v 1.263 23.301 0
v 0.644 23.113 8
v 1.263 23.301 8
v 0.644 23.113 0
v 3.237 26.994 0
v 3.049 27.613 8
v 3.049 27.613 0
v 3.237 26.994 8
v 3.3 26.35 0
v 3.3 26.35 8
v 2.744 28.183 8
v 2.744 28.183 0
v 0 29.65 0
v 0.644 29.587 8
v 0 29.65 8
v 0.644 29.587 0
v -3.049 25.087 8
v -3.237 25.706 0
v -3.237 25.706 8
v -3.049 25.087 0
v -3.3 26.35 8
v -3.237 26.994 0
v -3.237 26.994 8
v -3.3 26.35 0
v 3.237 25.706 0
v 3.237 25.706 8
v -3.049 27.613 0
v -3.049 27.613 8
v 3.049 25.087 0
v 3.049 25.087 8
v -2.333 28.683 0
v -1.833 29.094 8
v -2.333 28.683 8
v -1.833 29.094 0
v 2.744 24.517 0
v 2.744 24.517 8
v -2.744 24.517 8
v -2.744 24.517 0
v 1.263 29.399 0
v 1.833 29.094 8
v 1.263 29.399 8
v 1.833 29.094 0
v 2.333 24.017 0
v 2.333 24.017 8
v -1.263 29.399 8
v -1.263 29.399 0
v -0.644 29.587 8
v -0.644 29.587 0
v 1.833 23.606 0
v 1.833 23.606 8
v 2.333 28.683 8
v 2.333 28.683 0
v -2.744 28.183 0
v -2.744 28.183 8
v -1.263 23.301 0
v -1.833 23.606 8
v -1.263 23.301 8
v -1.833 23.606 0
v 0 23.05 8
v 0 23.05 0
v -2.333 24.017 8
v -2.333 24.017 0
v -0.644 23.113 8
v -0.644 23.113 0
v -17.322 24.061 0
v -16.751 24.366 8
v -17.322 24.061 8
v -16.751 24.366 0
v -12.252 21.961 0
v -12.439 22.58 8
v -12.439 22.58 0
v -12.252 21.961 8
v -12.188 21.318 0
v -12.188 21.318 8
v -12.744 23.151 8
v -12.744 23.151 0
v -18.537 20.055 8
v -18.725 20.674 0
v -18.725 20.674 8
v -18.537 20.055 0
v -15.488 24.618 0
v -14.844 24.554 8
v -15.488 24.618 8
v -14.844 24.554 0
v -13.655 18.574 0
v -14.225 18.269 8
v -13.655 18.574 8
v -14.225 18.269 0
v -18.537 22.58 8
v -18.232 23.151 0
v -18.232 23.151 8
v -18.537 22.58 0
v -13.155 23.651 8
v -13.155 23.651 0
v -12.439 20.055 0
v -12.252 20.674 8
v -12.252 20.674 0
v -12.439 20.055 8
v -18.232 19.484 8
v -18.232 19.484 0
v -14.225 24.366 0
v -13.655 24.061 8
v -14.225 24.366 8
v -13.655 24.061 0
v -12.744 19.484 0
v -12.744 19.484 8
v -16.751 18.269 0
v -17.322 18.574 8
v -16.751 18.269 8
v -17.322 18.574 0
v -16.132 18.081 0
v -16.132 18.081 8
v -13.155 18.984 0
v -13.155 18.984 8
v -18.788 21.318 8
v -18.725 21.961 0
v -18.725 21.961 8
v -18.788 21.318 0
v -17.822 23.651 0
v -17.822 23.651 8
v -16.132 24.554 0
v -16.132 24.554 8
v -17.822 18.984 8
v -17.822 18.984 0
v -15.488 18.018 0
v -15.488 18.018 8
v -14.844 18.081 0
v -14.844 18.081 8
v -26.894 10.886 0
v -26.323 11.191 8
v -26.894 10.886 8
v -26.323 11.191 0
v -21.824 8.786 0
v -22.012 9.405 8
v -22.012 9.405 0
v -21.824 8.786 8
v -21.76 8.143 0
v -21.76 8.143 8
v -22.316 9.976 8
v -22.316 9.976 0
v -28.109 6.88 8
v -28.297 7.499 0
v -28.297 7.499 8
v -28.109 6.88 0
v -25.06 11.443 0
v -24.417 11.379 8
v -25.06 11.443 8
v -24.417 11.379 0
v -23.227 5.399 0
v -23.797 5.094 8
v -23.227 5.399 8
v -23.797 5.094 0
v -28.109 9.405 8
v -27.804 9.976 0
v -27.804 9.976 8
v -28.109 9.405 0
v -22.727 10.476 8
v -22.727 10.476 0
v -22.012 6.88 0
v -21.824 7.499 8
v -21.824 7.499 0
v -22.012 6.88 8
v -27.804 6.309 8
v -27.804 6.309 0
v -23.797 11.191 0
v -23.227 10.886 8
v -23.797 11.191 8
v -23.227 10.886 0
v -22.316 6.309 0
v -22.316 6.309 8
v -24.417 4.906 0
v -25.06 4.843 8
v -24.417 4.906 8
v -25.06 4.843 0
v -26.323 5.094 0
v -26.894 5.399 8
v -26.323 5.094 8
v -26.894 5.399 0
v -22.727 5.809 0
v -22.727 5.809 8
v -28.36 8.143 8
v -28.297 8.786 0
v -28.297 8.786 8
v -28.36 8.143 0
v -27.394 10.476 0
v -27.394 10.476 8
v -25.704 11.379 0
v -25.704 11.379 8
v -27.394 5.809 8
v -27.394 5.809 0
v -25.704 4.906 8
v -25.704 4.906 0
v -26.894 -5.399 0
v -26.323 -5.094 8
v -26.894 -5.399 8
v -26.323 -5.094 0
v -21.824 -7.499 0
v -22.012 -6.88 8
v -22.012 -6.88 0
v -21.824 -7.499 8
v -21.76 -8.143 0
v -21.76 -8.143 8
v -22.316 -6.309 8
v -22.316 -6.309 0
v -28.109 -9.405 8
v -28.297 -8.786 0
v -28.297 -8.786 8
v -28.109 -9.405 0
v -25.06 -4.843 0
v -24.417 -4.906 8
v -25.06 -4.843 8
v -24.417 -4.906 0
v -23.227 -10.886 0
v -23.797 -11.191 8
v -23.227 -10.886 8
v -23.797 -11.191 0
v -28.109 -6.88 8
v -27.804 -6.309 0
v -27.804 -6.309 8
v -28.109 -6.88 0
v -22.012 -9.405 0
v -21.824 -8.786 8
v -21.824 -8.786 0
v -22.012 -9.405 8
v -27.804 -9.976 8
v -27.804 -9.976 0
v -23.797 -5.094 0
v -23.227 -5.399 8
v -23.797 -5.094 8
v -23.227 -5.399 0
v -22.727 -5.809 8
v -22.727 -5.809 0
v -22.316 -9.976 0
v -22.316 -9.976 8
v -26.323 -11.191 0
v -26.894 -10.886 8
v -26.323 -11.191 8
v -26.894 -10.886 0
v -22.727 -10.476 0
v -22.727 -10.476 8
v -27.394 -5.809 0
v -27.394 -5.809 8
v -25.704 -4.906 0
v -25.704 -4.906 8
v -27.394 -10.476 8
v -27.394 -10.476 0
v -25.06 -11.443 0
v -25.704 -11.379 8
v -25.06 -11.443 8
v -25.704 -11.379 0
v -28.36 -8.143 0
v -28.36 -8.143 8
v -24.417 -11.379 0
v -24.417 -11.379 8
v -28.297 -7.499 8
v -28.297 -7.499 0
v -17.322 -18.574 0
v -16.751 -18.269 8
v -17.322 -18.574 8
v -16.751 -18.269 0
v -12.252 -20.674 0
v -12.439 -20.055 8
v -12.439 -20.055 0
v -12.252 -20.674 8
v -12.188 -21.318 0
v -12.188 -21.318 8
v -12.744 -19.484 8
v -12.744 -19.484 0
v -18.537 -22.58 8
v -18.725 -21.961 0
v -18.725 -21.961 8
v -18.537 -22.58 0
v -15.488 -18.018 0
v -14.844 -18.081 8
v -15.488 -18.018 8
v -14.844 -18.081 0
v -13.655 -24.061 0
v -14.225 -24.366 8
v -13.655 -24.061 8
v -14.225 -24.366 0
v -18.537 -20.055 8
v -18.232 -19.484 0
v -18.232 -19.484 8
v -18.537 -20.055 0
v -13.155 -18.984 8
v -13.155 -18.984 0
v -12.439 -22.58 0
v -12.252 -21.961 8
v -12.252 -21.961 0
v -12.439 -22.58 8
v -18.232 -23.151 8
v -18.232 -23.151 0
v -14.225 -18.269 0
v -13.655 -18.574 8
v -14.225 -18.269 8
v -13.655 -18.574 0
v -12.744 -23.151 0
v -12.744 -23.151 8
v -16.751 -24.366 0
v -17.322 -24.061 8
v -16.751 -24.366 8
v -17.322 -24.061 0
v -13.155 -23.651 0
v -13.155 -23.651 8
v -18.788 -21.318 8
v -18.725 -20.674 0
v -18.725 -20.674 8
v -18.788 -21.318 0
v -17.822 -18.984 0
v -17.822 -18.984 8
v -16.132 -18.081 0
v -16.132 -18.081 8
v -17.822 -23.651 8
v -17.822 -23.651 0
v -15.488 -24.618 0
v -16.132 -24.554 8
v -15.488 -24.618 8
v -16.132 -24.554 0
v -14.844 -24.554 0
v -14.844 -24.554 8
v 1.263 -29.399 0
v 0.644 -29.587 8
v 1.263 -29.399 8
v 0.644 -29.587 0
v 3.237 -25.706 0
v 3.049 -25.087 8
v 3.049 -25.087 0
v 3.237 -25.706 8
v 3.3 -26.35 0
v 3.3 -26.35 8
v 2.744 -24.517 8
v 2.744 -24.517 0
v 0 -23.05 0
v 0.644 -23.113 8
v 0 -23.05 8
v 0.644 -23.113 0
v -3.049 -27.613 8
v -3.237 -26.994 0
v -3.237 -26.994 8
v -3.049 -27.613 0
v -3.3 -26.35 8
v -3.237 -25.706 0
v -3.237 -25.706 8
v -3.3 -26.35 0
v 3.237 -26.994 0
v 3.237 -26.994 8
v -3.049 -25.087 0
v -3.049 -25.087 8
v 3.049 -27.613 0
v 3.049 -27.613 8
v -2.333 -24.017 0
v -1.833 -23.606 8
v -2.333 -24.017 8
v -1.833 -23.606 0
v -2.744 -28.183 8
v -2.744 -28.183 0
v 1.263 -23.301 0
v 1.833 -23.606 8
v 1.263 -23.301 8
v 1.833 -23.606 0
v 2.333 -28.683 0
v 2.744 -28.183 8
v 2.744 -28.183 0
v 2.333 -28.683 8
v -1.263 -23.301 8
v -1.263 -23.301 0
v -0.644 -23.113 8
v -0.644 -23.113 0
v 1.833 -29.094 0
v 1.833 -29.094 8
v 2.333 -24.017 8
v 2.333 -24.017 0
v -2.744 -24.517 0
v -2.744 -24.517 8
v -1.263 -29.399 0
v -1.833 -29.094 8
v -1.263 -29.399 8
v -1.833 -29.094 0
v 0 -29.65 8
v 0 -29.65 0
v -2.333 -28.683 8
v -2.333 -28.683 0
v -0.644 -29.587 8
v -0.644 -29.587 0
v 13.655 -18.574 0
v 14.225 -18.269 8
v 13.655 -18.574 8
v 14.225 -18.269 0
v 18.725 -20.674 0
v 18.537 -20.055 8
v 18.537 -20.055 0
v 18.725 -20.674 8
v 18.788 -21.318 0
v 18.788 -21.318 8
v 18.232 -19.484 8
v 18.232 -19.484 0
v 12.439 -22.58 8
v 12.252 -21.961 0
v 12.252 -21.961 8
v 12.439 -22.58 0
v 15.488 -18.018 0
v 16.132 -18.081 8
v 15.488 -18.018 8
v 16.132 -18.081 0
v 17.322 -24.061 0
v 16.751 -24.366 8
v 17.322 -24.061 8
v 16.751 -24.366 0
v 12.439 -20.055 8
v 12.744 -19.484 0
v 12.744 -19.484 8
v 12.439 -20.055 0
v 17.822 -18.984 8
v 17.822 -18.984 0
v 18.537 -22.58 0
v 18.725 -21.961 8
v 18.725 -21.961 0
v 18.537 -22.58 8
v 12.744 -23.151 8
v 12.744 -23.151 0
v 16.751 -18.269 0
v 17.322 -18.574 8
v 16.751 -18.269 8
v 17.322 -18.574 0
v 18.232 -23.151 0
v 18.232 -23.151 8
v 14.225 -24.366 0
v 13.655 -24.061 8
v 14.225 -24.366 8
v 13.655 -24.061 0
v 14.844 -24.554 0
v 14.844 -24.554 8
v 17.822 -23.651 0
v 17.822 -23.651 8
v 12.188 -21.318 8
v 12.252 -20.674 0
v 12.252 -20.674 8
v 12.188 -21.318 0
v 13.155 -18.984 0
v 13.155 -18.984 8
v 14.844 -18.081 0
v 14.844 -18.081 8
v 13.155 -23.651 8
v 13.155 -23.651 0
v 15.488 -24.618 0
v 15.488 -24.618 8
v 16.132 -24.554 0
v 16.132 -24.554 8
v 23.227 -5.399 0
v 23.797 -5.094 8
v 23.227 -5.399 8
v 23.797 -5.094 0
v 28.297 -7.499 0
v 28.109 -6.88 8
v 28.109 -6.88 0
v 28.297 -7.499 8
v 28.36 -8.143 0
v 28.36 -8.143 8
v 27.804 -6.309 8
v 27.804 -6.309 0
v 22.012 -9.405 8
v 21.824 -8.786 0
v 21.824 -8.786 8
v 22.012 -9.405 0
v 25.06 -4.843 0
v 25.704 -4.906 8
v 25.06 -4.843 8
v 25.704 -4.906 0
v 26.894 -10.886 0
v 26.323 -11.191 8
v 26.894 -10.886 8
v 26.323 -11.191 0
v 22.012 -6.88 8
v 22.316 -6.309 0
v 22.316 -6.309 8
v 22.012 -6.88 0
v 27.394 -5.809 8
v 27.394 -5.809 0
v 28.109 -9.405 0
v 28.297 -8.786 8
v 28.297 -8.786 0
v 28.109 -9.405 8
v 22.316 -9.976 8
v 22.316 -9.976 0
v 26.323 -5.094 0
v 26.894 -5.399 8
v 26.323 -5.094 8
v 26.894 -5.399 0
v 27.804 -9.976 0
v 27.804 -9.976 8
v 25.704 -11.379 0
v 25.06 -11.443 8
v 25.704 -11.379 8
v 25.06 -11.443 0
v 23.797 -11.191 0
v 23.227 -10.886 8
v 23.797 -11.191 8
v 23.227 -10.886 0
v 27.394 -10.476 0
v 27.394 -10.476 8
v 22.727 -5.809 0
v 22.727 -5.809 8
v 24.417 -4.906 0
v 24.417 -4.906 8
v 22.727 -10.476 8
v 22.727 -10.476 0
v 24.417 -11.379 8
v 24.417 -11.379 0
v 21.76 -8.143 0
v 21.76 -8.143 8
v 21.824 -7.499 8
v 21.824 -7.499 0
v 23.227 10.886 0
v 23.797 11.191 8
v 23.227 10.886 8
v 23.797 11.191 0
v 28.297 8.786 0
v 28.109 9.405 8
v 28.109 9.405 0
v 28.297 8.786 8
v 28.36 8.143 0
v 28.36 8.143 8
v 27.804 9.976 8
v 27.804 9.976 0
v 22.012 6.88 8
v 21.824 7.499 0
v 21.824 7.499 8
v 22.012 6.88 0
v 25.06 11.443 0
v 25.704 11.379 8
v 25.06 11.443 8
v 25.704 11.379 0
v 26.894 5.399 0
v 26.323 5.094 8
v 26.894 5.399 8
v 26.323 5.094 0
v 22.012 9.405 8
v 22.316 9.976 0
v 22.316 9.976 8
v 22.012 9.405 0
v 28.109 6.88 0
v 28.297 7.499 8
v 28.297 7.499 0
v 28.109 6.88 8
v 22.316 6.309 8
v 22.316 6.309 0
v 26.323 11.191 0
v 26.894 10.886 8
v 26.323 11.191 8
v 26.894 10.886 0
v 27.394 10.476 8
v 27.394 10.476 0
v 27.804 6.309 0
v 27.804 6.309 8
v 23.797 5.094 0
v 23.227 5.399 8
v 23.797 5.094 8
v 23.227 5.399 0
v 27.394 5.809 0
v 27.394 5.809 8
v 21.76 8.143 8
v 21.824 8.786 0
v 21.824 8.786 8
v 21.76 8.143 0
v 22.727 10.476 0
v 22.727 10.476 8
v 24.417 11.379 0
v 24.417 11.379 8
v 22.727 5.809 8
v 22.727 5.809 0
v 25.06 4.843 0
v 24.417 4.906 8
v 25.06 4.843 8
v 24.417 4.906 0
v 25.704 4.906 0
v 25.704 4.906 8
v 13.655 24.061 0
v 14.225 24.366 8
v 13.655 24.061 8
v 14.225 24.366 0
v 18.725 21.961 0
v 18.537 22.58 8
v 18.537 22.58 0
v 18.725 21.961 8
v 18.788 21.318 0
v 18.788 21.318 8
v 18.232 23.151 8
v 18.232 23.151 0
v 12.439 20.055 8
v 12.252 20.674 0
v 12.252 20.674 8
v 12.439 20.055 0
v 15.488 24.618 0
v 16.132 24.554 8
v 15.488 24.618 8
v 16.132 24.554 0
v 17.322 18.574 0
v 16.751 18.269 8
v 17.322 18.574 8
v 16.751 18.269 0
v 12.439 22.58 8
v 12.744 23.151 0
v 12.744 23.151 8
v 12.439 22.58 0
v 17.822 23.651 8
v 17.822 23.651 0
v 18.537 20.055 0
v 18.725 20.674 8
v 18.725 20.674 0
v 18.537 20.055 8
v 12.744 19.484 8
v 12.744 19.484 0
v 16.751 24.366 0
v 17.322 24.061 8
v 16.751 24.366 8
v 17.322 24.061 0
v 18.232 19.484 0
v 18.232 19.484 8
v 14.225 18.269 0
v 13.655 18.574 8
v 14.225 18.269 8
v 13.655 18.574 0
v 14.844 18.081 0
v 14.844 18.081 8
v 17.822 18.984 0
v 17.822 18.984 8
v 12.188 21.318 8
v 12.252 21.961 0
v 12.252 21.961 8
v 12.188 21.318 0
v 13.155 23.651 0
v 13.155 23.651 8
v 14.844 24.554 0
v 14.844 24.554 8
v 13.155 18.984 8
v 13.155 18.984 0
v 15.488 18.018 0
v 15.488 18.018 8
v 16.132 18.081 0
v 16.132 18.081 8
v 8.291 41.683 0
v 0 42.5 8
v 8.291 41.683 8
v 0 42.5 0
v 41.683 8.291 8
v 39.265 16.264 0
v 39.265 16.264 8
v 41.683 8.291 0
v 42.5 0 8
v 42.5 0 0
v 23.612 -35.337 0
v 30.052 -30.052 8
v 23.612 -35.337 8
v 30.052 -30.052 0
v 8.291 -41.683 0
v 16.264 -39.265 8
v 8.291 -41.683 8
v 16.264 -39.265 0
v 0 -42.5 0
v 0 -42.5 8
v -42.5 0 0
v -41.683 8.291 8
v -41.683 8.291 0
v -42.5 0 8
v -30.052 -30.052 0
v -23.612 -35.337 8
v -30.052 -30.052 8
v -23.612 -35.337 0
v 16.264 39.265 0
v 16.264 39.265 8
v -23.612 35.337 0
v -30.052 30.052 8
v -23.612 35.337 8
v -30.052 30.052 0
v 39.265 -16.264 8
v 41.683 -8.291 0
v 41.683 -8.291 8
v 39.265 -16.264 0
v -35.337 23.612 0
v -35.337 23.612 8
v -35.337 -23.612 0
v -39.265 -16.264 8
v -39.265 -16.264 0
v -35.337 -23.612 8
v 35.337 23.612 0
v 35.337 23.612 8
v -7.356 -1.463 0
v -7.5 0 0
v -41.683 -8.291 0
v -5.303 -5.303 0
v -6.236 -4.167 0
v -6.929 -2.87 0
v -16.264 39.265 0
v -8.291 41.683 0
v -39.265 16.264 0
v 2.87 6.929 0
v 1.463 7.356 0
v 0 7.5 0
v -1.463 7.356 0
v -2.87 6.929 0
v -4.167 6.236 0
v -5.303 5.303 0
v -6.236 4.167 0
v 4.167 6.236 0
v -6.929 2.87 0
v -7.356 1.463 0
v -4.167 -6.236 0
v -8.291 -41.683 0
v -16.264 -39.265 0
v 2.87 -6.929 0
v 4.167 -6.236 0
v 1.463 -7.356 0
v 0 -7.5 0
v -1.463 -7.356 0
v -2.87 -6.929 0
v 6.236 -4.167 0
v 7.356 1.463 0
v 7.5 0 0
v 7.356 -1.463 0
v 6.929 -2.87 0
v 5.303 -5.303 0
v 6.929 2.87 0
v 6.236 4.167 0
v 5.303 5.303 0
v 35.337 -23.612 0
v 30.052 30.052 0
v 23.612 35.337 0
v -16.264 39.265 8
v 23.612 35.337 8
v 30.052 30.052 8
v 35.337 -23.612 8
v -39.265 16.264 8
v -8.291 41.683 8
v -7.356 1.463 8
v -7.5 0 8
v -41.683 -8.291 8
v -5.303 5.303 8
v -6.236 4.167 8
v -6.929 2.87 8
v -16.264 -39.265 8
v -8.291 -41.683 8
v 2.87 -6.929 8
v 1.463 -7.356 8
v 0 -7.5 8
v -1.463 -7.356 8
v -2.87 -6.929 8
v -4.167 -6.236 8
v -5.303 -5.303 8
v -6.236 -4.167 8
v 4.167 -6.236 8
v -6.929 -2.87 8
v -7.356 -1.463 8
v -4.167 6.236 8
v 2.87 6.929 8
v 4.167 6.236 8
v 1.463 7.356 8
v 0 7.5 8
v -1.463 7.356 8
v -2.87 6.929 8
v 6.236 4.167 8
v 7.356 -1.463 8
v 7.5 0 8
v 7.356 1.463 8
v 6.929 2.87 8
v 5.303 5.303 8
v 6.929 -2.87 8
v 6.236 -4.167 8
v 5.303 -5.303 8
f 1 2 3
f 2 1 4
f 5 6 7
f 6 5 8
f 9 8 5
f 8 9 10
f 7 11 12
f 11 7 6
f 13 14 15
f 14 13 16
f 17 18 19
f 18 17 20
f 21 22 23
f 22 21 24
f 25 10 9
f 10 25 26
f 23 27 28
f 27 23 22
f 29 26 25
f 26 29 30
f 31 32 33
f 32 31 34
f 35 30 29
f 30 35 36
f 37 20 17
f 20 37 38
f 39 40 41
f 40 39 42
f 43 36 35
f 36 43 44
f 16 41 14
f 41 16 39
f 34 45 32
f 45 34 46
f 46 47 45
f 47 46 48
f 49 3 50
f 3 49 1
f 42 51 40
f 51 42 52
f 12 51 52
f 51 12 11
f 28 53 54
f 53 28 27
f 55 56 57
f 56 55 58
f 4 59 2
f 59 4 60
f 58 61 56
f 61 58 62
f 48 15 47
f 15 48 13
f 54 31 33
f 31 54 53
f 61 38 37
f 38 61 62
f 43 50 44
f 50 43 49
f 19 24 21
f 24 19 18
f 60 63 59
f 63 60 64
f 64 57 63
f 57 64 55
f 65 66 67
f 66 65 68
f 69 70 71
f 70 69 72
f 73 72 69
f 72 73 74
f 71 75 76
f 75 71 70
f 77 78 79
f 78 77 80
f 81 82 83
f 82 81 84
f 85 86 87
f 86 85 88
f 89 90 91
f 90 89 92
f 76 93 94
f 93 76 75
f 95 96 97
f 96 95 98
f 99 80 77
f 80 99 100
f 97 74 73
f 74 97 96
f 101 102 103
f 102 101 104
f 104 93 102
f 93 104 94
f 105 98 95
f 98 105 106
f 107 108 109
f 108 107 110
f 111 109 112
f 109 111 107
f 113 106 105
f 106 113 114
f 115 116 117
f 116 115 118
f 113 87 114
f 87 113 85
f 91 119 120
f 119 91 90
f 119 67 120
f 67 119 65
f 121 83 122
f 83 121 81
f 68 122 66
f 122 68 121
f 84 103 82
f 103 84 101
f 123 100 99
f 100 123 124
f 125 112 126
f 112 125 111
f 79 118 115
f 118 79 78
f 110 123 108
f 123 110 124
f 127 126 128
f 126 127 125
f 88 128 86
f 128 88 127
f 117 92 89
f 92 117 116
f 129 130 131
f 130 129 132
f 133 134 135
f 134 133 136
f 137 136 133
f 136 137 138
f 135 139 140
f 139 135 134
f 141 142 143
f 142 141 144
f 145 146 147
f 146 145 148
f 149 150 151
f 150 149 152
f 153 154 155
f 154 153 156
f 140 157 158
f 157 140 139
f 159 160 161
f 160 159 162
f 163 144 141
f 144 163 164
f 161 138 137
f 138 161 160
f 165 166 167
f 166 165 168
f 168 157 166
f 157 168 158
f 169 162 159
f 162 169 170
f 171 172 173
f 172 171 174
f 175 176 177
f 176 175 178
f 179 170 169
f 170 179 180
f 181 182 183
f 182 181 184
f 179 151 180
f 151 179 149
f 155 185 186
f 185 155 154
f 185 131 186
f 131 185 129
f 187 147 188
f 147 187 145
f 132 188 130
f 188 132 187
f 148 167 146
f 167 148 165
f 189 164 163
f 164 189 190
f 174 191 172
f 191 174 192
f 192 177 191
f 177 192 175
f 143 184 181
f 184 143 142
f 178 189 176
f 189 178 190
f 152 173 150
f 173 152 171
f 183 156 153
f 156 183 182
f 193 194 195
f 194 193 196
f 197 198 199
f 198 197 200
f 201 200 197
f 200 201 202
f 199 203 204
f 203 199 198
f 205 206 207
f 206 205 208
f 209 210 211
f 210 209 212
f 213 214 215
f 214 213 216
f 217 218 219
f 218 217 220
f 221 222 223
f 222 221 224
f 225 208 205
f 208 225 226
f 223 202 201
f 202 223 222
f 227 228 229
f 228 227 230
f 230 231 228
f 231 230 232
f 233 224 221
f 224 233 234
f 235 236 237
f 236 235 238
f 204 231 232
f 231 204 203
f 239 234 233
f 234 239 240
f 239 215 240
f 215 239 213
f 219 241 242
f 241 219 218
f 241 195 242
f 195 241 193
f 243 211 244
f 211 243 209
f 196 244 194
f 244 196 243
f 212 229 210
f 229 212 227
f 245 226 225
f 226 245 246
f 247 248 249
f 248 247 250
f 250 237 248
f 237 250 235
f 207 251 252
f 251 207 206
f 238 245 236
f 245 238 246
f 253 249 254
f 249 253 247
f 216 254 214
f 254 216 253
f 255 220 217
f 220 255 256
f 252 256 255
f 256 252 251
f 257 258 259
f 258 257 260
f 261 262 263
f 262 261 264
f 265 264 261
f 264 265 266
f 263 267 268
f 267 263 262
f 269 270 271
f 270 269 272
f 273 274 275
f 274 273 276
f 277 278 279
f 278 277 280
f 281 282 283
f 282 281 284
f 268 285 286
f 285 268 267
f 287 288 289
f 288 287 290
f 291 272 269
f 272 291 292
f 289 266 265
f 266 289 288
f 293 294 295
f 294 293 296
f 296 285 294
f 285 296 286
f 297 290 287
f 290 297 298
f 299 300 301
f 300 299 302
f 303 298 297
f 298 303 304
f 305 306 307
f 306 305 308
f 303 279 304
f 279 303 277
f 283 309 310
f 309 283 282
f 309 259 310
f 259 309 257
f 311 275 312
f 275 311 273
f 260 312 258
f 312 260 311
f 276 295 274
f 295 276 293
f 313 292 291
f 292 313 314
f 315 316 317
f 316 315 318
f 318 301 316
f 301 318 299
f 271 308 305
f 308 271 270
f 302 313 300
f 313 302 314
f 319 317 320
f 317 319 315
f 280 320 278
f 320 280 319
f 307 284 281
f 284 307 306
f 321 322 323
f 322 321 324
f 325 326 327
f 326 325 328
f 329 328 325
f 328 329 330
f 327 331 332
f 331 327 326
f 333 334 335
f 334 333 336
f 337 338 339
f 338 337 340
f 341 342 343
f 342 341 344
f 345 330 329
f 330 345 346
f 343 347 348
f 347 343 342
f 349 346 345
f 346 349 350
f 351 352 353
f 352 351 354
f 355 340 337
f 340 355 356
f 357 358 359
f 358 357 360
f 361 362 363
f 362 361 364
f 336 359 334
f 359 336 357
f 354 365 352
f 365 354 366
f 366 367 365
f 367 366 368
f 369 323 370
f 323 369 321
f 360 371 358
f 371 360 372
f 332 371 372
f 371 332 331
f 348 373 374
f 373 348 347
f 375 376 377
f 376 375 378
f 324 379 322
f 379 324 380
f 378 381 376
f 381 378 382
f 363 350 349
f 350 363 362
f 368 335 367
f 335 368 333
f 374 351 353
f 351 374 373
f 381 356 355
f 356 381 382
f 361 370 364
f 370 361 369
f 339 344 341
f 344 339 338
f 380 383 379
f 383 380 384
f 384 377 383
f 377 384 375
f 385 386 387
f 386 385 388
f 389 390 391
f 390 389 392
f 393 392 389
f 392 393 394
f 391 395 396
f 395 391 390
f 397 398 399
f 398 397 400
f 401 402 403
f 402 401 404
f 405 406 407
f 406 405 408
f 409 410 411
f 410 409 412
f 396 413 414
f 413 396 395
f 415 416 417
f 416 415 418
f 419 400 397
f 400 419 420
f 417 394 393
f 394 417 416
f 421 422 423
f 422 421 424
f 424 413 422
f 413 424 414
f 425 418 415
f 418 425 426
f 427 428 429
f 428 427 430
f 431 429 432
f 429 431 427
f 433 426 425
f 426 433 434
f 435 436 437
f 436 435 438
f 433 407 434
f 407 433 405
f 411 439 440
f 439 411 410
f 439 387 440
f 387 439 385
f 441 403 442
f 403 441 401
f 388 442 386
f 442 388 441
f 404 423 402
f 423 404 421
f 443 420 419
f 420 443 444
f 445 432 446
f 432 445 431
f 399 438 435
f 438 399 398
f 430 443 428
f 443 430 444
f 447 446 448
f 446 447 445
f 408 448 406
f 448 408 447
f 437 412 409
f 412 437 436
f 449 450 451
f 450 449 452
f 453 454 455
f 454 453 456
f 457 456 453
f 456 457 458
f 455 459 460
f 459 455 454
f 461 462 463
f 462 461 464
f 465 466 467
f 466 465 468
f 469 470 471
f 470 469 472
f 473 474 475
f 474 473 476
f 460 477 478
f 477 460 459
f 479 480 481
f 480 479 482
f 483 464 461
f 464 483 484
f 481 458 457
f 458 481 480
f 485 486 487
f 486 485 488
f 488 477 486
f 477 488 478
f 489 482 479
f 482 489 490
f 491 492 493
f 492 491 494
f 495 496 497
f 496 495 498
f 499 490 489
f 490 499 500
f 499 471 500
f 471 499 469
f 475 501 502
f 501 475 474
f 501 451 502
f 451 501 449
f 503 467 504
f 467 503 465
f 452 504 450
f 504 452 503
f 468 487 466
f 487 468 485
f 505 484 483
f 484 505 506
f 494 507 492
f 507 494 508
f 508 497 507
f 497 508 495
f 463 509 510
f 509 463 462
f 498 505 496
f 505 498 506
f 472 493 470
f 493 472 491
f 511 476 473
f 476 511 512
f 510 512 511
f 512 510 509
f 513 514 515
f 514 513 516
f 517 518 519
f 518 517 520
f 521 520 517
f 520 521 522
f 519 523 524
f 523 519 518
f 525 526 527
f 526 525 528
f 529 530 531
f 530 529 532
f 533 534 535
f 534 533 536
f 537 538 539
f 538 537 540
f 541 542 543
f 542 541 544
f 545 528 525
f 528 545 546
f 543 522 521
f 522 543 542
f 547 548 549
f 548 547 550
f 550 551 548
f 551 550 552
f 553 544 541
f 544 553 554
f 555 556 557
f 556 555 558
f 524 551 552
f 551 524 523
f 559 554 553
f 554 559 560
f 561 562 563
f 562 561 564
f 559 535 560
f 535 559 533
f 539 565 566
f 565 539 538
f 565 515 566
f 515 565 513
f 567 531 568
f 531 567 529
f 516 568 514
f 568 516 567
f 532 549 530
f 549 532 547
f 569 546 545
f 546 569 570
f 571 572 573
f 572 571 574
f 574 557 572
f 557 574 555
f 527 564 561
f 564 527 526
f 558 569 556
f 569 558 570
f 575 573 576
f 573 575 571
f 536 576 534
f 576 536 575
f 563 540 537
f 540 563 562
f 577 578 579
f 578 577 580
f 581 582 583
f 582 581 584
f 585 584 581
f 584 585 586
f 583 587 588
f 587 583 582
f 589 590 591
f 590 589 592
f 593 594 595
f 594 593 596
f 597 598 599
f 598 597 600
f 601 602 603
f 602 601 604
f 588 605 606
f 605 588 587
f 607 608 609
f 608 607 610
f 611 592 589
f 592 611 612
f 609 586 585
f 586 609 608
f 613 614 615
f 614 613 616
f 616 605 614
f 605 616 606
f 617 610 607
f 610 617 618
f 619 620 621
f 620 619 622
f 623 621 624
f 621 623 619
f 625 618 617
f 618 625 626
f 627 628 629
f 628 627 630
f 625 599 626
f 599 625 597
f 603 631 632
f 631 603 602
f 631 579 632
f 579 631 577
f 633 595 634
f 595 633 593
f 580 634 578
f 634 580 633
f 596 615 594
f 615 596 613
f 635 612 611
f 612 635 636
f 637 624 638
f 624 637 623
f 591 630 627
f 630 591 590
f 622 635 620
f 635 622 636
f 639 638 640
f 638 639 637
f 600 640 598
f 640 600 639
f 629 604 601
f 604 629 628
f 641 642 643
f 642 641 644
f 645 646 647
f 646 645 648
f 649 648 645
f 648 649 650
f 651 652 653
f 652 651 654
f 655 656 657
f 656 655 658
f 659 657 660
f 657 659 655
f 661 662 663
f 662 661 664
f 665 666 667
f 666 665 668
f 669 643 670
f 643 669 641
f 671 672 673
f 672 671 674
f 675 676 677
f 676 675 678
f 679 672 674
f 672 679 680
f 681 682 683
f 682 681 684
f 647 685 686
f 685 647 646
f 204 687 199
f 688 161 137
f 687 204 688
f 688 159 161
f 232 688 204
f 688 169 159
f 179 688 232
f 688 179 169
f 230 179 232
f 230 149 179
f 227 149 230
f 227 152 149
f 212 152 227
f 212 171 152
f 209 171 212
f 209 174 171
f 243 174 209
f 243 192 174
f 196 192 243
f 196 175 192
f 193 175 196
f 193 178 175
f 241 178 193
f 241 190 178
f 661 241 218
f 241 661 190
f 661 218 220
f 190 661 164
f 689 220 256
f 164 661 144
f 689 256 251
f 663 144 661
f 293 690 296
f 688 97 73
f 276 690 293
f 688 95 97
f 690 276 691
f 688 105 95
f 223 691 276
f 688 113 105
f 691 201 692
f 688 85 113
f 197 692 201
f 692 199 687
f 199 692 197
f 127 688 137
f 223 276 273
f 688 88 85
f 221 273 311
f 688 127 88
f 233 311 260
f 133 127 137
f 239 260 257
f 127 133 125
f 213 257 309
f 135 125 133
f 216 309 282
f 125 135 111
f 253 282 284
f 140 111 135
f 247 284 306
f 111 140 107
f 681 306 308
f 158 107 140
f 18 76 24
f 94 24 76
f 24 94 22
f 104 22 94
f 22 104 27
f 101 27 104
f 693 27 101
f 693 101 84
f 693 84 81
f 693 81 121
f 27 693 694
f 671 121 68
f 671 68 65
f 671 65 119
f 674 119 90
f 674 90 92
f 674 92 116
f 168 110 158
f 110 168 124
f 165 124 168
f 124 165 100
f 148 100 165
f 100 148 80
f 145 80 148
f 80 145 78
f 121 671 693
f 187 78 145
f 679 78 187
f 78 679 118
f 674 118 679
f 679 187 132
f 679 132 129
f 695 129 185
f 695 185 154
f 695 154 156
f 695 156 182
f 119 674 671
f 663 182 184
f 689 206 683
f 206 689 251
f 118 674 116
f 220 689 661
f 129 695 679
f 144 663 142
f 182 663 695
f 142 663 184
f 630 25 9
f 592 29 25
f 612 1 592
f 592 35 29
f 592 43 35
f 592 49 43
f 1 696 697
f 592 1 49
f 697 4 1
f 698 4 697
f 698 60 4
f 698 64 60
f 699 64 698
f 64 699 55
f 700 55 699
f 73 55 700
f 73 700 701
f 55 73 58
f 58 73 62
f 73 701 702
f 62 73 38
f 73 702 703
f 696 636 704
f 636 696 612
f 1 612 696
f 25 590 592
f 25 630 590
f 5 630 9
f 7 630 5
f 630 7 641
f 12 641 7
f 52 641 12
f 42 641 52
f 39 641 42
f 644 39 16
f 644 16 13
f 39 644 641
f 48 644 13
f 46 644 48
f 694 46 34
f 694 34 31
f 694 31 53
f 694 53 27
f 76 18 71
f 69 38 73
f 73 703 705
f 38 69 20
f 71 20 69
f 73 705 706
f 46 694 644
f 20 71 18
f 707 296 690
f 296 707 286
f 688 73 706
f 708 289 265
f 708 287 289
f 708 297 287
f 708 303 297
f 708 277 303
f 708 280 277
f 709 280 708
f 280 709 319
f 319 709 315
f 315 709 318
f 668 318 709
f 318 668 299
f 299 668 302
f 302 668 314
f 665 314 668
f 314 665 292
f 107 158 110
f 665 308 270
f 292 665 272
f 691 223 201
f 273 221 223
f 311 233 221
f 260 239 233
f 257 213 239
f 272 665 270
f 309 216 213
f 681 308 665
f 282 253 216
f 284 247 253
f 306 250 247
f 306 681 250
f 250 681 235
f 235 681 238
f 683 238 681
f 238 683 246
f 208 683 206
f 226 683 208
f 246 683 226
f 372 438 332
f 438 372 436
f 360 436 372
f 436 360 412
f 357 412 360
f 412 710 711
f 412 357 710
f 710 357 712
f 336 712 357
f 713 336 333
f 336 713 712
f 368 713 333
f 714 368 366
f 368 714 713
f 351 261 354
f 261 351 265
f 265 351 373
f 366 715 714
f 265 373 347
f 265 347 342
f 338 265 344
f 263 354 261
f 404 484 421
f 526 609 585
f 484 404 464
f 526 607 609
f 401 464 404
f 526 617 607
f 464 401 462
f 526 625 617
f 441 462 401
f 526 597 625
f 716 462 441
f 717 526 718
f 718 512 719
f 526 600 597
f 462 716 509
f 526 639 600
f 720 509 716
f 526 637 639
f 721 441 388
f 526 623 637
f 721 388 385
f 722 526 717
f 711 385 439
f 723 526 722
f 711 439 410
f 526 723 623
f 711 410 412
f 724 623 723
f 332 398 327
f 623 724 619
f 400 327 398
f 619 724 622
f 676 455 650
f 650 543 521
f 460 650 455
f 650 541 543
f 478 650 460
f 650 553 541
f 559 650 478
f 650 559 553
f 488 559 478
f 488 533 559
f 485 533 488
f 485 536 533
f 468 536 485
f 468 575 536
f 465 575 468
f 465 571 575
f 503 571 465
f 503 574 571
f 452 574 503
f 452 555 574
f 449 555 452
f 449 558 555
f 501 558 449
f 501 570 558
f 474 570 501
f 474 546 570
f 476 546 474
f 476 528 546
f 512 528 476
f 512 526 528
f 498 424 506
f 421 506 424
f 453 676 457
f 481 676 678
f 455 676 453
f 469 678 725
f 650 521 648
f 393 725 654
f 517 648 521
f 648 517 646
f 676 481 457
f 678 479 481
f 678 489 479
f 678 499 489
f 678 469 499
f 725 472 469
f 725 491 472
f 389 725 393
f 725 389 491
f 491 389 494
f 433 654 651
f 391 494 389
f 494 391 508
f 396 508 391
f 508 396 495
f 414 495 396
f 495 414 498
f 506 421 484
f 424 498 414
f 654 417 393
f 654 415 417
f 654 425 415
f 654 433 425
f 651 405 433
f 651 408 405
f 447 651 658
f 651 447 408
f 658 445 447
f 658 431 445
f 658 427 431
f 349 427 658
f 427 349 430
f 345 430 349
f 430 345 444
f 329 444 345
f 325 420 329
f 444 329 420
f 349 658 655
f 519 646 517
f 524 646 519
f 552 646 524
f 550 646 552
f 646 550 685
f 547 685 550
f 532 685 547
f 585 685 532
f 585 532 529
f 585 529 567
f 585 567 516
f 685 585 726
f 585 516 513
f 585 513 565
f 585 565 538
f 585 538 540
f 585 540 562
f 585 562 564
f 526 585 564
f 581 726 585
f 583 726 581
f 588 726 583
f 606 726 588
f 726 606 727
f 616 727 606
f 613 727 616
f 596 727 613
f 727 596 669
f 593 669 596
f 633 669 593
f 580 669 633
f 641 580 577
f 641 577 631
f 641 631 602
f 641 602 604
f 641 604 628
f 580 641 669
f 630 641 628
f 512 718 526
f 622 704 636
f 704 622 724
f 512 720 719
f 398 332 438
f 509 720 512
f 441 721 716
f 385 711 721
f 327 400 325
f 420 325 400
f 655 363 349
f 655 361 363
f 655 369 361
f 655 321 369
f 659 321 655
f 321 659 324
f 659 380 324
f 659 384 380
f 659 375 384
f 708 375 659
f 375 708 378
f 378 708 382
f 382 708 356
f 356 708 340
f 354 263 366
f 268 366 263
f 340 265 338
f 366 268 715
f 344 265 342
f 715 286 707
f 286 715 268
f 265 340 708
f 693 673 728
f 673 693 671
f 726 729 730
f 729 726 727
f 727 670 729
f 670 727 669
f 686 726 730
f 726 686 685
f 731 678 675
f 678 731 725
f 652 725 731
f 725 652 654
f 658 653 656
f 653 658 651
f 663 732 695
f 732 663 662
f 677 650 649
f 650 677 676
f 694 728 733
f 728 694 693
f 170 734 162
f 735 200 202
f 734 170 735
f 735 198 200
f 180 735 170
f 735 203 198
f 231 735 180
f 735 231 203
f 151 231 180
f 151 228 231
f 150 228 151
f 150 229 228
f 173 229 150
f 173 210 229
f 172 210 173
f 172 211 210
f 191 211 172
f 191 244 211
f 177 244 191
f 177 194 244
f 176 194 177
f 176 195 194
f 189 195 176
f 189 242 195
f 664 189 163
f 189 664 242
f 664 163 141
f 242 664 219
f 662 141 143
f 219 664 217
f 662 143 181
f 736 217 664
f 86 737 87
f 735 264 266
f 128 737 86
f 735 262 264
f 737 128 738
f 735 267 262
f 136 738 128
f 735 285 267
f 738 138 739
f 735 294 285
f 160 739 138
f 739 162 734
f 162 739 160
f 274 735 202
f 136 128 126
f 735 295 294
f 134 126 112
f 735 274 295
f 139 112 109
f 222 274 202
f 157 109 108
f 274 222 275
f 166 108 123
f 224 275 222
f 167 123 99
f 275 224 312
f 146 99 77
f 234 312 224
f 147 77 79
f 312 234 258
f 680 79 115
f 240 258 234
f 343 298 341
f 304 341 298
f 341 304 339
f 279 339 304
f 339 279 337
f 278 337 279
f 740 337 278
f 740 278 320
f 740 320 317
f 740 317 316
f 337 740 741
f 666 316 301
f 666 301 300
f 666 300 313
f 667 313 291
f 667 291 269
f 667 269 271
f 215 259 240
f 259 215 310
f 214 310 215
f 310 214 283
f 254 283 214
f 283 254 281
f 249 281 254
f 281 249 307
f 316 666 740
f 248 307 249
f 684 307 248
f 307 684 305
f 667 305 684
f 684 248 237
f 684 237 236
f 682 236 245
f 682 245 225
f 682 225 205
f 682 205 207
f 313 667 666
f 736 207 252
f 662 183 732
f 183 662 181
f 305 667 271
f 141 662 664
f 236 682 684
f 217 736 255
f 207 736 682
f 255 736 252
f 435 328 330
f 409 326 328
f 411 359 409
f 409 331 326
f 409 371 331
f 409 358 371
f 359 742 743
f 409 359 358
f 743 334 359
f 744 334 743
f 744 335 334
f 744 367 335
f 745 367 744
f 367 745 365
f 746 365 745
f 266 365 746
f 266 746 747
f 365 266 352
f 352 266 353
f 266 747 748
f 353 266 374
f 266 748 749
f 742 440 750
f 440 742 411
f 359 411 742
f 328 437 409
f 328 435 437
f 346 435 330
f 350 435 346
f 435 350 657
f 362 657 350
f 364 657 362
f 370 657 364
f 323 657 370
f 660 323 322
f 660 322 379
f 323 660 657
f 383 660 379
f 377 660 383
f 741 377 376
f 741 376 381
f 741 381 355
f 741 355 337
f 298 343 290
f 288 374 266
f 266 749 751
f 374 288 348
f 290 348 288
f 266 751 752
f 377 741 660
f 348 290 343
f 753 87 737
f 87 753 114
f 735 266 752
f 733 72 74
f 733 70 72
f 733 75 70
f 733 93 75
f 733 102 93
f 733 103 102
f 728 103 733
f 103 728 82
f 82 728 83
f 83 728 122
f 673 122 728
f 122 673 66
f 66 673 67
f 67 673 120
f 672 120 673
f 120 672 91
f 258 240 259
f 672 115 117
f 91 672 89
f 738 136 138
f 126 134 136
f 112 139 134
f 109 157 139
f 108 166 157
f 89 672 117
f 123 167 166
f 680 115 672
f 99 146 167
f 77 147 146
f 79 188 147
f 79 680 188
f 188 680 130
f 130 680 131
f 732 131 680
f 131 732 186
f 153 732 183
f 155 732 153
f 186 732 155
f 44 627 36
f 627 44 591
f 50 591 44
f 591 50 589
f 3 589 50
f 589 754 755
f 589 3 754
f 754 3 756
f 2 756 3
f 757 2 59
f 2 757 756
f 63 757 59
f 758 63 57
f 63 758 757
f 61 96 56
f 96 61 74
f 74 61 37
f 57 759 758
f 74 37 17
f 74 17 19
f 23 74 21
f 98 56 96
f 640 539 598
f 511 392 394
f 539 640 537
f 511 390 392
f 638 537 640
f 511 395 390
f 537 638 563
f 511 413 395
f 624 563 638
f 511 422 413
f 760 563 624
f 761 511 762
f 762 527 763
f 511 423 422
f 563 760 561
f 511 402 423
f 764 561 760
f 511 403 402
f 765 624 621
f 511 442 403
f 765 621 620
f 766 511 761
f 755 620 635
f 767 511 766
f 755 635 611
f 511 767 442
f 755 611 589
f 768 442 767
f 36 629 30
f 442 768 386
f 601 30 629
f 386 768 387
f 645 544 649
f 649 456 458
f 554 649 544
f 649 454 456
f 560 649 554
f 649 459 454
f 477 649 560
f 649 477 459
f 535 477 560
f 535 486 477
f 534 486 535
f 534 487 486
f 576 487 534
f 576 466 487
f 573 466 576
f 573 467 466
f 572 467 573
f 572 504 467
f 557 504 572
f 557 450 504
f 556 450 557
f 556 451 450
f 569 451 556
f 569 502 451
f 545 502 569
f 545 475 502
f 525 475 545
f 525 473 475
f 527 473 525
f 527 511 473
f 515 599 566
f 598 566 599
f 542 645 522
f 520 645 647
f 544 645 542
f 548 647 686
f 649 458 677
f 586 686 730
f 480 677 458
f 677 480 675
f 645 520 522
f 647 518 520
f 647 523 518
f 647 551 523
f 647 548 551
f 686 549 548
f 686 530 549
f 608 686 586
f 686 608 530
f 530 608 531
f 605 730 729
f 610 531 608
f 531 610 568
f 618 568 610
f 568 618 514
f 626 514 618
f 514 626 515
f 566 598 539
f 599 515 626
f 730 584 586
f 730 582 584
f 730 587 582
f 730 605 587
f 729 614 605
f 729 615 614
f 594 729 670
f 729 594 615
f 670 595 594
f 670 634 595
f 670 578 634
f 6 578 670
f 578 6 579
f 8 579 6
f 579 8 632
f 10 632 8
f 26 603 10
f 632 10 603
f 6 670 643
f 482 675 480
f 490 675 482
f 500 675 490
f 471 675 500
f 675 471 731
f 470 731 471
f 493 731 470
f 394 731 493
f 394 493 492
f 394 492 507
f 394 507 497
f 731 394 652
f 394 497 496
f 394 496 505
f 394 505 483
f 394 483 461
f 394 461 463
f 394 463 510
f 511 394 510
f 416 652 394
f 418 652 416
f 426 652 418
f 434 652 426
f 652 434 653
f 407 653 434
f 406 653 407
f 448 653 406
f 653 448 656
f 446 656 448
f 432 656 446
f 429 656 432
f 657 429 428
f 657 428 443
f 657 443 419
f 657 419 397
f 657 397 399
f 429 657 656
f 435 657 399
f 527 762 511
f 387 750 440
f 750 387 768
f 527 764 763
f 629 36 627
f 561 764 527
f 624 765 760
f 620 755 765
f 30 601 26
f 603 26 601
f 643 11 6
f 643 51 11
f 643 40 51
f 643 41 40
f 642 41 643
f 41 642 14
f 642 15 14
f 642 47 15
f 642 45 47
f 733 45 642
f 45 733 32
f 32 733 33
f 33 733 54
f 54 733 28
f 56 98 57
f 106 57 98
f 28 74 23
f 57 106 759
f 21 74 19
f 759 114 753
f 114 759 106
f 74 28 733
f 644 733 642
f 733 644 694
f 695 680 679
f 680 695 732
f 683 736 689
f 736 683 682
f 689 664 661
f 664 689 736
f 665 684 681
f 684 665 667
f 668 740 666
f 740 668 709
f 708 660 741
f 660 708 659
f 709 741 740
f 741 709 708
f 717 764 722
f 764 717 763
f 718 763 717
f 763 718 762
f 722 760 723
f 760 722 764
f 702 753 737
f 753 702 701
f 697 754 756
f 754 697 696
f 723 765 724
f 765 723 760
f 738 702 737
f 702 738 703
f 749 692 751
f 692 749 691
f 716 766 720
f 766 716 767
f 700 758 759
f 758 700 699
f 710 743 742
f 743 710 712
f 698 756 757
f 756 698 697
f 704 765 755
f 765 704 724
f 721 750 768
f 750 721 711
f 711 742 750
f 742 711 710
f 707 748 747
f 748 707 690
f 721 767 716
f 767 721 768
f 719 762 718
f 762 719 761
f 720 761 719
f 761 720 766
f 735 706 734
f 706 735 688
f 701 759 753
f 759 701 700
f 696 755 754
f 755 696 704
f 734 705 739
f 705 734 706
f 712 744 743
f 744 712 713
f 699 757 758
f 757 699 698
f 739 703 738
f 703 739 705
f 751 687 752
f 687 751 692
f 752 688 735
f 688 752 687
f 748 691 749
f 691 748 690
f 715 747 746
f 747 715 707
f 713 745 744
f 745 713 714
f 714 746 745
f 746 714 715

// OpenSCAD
$fn = 32;

// ----------------------------------------------------------------------
// Flange Ø85 x 8
// 10 holes on a Ø52.7 bolt circle, bolted joints
// ----------------------------------------------------------------------

// --- parameters (mm) ---
flange_d = 85;   // outside diameter of the flange
thickness = 8;   // flange thickness
holes = 10;      // number of bolt holes
pcd = 52.7;      // bolt circle diameter
start_deg = 90;  // angle of the first hole, from +X
hole_d = 6.6;    // bolt hole diameter
bore_d = 15;     // central through bore
hub_d = 23;      // hub outside diameter
hub_h = 0;       // hub height above the flange face (0 = no hub)

// --- derived feature positions (mm) ---
height = thickness + hub_h;  // = 8   overall height of the part
pcd_r = pcd / 2;             // = 26.35   bolt circle radius
hole_step = 360 / holes;     // = 36   angular pitch
feature_centers = [
  [pcd_r * cos(start_deg + 0 * hole_step), pcd_r * sin(start_deg + 0 * hole_step)],
  [pcd_r * cos(start_deg + 1 * hole_step), pcd_r * sin(start_deg + 1 * hole_step)],
  [pcd_r * cos(start_deg + 2 * hole_step), pcd_r * sin(start_deg + 2 * hole_step)],
  [pcd_r * cos(start_deg + 3 * hole_step), pcd_r * sin(start_deg + 3 * hole_step)],
  [pcd_r * cos(start_deg + 4 * hole_step), pcd_r * sin(start_deg + 4 * hole_step)],
  [pcd_r * cos(start_deg + 5 * hole_step), pcd_r * sin(start_deg + 5 * hole_step)],
  [pcd_r * cos(start_deg + 6 * hole_step), pcd_r * sin(start_deg + 6 * hole_step)],
  [pcd_r * cos(start_deg + 7 * hole_step), pcd_r * sin(start_deg + 7 * hole_step)],
  [pcd_r * cos(start_deg + 8 * hole_step), pcd_r * sin(start_deg + 8 * hole_step)],
  [pcd_r * cos(start_deg + 9 * hole_step), pcd_r * sin(start_deg + 9 * hole_step)]
];   // bolt hole centres on the pitch circle

// flange disc, every hole and the bore cut straight through
difference() {
  union() {
    cylinder(d = flange_d, h = thickness);
  }
  translate([0, 0, -1]) cylinder(d = bore_d, h = height + 2);  // bore, through
  for (centre = feature_centers)
    translate([centre[0], centre[1], -1]) cylinder(d = hole_d, h = thickness + 2);
}
